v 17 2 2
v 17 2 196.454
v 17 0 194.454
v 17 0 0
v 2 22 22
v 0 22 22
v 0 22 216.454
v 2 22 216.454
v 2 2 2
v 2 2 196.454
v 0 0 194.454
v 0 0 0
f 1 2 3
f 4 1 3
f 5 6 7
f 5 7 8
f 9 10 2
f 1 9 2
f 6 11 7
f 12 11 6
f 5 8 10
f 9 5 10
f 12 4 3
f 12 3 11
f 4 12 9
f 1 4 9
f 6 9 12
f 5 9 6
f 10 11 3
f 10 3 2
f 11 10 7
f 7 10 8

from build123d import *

# Parameters (mm, degrees)
BOSS_EXTRUDE1_DEPTH = 250
CUT_EXTRUDE1_DEPTH  = 150


with BuildPart() as part:
    # Sketch1 → Boss-Extrude1 (new body)
    with BuildSketch(Plane.XY):
        Polygon((0, 0), (0, 22), (2, 22), (2, 2), (17, 2), (17, 0), align=None)
    extrude(amount=BOSS_EXTRUDE1_DEPTH)

    # Sketch2 → Cut-Extrude1 (cut)
    with BuildSketch(Plane(origin=(17, 0, 0), x_dir=(0, 0, -1), z_dir=(1, 0, 0))):
        Polygon((-216.454364826, 22), (-250, 22), (-250, 0), (-194.454364826, 0), align=None)
        Polygon((-22, 22), (0, 22), (0, 0), align=None)
    extrude(amount=-CUT_EXTRUDE1_DEPTH, mode=Mode.SUBTRACT)


solid = part.part
